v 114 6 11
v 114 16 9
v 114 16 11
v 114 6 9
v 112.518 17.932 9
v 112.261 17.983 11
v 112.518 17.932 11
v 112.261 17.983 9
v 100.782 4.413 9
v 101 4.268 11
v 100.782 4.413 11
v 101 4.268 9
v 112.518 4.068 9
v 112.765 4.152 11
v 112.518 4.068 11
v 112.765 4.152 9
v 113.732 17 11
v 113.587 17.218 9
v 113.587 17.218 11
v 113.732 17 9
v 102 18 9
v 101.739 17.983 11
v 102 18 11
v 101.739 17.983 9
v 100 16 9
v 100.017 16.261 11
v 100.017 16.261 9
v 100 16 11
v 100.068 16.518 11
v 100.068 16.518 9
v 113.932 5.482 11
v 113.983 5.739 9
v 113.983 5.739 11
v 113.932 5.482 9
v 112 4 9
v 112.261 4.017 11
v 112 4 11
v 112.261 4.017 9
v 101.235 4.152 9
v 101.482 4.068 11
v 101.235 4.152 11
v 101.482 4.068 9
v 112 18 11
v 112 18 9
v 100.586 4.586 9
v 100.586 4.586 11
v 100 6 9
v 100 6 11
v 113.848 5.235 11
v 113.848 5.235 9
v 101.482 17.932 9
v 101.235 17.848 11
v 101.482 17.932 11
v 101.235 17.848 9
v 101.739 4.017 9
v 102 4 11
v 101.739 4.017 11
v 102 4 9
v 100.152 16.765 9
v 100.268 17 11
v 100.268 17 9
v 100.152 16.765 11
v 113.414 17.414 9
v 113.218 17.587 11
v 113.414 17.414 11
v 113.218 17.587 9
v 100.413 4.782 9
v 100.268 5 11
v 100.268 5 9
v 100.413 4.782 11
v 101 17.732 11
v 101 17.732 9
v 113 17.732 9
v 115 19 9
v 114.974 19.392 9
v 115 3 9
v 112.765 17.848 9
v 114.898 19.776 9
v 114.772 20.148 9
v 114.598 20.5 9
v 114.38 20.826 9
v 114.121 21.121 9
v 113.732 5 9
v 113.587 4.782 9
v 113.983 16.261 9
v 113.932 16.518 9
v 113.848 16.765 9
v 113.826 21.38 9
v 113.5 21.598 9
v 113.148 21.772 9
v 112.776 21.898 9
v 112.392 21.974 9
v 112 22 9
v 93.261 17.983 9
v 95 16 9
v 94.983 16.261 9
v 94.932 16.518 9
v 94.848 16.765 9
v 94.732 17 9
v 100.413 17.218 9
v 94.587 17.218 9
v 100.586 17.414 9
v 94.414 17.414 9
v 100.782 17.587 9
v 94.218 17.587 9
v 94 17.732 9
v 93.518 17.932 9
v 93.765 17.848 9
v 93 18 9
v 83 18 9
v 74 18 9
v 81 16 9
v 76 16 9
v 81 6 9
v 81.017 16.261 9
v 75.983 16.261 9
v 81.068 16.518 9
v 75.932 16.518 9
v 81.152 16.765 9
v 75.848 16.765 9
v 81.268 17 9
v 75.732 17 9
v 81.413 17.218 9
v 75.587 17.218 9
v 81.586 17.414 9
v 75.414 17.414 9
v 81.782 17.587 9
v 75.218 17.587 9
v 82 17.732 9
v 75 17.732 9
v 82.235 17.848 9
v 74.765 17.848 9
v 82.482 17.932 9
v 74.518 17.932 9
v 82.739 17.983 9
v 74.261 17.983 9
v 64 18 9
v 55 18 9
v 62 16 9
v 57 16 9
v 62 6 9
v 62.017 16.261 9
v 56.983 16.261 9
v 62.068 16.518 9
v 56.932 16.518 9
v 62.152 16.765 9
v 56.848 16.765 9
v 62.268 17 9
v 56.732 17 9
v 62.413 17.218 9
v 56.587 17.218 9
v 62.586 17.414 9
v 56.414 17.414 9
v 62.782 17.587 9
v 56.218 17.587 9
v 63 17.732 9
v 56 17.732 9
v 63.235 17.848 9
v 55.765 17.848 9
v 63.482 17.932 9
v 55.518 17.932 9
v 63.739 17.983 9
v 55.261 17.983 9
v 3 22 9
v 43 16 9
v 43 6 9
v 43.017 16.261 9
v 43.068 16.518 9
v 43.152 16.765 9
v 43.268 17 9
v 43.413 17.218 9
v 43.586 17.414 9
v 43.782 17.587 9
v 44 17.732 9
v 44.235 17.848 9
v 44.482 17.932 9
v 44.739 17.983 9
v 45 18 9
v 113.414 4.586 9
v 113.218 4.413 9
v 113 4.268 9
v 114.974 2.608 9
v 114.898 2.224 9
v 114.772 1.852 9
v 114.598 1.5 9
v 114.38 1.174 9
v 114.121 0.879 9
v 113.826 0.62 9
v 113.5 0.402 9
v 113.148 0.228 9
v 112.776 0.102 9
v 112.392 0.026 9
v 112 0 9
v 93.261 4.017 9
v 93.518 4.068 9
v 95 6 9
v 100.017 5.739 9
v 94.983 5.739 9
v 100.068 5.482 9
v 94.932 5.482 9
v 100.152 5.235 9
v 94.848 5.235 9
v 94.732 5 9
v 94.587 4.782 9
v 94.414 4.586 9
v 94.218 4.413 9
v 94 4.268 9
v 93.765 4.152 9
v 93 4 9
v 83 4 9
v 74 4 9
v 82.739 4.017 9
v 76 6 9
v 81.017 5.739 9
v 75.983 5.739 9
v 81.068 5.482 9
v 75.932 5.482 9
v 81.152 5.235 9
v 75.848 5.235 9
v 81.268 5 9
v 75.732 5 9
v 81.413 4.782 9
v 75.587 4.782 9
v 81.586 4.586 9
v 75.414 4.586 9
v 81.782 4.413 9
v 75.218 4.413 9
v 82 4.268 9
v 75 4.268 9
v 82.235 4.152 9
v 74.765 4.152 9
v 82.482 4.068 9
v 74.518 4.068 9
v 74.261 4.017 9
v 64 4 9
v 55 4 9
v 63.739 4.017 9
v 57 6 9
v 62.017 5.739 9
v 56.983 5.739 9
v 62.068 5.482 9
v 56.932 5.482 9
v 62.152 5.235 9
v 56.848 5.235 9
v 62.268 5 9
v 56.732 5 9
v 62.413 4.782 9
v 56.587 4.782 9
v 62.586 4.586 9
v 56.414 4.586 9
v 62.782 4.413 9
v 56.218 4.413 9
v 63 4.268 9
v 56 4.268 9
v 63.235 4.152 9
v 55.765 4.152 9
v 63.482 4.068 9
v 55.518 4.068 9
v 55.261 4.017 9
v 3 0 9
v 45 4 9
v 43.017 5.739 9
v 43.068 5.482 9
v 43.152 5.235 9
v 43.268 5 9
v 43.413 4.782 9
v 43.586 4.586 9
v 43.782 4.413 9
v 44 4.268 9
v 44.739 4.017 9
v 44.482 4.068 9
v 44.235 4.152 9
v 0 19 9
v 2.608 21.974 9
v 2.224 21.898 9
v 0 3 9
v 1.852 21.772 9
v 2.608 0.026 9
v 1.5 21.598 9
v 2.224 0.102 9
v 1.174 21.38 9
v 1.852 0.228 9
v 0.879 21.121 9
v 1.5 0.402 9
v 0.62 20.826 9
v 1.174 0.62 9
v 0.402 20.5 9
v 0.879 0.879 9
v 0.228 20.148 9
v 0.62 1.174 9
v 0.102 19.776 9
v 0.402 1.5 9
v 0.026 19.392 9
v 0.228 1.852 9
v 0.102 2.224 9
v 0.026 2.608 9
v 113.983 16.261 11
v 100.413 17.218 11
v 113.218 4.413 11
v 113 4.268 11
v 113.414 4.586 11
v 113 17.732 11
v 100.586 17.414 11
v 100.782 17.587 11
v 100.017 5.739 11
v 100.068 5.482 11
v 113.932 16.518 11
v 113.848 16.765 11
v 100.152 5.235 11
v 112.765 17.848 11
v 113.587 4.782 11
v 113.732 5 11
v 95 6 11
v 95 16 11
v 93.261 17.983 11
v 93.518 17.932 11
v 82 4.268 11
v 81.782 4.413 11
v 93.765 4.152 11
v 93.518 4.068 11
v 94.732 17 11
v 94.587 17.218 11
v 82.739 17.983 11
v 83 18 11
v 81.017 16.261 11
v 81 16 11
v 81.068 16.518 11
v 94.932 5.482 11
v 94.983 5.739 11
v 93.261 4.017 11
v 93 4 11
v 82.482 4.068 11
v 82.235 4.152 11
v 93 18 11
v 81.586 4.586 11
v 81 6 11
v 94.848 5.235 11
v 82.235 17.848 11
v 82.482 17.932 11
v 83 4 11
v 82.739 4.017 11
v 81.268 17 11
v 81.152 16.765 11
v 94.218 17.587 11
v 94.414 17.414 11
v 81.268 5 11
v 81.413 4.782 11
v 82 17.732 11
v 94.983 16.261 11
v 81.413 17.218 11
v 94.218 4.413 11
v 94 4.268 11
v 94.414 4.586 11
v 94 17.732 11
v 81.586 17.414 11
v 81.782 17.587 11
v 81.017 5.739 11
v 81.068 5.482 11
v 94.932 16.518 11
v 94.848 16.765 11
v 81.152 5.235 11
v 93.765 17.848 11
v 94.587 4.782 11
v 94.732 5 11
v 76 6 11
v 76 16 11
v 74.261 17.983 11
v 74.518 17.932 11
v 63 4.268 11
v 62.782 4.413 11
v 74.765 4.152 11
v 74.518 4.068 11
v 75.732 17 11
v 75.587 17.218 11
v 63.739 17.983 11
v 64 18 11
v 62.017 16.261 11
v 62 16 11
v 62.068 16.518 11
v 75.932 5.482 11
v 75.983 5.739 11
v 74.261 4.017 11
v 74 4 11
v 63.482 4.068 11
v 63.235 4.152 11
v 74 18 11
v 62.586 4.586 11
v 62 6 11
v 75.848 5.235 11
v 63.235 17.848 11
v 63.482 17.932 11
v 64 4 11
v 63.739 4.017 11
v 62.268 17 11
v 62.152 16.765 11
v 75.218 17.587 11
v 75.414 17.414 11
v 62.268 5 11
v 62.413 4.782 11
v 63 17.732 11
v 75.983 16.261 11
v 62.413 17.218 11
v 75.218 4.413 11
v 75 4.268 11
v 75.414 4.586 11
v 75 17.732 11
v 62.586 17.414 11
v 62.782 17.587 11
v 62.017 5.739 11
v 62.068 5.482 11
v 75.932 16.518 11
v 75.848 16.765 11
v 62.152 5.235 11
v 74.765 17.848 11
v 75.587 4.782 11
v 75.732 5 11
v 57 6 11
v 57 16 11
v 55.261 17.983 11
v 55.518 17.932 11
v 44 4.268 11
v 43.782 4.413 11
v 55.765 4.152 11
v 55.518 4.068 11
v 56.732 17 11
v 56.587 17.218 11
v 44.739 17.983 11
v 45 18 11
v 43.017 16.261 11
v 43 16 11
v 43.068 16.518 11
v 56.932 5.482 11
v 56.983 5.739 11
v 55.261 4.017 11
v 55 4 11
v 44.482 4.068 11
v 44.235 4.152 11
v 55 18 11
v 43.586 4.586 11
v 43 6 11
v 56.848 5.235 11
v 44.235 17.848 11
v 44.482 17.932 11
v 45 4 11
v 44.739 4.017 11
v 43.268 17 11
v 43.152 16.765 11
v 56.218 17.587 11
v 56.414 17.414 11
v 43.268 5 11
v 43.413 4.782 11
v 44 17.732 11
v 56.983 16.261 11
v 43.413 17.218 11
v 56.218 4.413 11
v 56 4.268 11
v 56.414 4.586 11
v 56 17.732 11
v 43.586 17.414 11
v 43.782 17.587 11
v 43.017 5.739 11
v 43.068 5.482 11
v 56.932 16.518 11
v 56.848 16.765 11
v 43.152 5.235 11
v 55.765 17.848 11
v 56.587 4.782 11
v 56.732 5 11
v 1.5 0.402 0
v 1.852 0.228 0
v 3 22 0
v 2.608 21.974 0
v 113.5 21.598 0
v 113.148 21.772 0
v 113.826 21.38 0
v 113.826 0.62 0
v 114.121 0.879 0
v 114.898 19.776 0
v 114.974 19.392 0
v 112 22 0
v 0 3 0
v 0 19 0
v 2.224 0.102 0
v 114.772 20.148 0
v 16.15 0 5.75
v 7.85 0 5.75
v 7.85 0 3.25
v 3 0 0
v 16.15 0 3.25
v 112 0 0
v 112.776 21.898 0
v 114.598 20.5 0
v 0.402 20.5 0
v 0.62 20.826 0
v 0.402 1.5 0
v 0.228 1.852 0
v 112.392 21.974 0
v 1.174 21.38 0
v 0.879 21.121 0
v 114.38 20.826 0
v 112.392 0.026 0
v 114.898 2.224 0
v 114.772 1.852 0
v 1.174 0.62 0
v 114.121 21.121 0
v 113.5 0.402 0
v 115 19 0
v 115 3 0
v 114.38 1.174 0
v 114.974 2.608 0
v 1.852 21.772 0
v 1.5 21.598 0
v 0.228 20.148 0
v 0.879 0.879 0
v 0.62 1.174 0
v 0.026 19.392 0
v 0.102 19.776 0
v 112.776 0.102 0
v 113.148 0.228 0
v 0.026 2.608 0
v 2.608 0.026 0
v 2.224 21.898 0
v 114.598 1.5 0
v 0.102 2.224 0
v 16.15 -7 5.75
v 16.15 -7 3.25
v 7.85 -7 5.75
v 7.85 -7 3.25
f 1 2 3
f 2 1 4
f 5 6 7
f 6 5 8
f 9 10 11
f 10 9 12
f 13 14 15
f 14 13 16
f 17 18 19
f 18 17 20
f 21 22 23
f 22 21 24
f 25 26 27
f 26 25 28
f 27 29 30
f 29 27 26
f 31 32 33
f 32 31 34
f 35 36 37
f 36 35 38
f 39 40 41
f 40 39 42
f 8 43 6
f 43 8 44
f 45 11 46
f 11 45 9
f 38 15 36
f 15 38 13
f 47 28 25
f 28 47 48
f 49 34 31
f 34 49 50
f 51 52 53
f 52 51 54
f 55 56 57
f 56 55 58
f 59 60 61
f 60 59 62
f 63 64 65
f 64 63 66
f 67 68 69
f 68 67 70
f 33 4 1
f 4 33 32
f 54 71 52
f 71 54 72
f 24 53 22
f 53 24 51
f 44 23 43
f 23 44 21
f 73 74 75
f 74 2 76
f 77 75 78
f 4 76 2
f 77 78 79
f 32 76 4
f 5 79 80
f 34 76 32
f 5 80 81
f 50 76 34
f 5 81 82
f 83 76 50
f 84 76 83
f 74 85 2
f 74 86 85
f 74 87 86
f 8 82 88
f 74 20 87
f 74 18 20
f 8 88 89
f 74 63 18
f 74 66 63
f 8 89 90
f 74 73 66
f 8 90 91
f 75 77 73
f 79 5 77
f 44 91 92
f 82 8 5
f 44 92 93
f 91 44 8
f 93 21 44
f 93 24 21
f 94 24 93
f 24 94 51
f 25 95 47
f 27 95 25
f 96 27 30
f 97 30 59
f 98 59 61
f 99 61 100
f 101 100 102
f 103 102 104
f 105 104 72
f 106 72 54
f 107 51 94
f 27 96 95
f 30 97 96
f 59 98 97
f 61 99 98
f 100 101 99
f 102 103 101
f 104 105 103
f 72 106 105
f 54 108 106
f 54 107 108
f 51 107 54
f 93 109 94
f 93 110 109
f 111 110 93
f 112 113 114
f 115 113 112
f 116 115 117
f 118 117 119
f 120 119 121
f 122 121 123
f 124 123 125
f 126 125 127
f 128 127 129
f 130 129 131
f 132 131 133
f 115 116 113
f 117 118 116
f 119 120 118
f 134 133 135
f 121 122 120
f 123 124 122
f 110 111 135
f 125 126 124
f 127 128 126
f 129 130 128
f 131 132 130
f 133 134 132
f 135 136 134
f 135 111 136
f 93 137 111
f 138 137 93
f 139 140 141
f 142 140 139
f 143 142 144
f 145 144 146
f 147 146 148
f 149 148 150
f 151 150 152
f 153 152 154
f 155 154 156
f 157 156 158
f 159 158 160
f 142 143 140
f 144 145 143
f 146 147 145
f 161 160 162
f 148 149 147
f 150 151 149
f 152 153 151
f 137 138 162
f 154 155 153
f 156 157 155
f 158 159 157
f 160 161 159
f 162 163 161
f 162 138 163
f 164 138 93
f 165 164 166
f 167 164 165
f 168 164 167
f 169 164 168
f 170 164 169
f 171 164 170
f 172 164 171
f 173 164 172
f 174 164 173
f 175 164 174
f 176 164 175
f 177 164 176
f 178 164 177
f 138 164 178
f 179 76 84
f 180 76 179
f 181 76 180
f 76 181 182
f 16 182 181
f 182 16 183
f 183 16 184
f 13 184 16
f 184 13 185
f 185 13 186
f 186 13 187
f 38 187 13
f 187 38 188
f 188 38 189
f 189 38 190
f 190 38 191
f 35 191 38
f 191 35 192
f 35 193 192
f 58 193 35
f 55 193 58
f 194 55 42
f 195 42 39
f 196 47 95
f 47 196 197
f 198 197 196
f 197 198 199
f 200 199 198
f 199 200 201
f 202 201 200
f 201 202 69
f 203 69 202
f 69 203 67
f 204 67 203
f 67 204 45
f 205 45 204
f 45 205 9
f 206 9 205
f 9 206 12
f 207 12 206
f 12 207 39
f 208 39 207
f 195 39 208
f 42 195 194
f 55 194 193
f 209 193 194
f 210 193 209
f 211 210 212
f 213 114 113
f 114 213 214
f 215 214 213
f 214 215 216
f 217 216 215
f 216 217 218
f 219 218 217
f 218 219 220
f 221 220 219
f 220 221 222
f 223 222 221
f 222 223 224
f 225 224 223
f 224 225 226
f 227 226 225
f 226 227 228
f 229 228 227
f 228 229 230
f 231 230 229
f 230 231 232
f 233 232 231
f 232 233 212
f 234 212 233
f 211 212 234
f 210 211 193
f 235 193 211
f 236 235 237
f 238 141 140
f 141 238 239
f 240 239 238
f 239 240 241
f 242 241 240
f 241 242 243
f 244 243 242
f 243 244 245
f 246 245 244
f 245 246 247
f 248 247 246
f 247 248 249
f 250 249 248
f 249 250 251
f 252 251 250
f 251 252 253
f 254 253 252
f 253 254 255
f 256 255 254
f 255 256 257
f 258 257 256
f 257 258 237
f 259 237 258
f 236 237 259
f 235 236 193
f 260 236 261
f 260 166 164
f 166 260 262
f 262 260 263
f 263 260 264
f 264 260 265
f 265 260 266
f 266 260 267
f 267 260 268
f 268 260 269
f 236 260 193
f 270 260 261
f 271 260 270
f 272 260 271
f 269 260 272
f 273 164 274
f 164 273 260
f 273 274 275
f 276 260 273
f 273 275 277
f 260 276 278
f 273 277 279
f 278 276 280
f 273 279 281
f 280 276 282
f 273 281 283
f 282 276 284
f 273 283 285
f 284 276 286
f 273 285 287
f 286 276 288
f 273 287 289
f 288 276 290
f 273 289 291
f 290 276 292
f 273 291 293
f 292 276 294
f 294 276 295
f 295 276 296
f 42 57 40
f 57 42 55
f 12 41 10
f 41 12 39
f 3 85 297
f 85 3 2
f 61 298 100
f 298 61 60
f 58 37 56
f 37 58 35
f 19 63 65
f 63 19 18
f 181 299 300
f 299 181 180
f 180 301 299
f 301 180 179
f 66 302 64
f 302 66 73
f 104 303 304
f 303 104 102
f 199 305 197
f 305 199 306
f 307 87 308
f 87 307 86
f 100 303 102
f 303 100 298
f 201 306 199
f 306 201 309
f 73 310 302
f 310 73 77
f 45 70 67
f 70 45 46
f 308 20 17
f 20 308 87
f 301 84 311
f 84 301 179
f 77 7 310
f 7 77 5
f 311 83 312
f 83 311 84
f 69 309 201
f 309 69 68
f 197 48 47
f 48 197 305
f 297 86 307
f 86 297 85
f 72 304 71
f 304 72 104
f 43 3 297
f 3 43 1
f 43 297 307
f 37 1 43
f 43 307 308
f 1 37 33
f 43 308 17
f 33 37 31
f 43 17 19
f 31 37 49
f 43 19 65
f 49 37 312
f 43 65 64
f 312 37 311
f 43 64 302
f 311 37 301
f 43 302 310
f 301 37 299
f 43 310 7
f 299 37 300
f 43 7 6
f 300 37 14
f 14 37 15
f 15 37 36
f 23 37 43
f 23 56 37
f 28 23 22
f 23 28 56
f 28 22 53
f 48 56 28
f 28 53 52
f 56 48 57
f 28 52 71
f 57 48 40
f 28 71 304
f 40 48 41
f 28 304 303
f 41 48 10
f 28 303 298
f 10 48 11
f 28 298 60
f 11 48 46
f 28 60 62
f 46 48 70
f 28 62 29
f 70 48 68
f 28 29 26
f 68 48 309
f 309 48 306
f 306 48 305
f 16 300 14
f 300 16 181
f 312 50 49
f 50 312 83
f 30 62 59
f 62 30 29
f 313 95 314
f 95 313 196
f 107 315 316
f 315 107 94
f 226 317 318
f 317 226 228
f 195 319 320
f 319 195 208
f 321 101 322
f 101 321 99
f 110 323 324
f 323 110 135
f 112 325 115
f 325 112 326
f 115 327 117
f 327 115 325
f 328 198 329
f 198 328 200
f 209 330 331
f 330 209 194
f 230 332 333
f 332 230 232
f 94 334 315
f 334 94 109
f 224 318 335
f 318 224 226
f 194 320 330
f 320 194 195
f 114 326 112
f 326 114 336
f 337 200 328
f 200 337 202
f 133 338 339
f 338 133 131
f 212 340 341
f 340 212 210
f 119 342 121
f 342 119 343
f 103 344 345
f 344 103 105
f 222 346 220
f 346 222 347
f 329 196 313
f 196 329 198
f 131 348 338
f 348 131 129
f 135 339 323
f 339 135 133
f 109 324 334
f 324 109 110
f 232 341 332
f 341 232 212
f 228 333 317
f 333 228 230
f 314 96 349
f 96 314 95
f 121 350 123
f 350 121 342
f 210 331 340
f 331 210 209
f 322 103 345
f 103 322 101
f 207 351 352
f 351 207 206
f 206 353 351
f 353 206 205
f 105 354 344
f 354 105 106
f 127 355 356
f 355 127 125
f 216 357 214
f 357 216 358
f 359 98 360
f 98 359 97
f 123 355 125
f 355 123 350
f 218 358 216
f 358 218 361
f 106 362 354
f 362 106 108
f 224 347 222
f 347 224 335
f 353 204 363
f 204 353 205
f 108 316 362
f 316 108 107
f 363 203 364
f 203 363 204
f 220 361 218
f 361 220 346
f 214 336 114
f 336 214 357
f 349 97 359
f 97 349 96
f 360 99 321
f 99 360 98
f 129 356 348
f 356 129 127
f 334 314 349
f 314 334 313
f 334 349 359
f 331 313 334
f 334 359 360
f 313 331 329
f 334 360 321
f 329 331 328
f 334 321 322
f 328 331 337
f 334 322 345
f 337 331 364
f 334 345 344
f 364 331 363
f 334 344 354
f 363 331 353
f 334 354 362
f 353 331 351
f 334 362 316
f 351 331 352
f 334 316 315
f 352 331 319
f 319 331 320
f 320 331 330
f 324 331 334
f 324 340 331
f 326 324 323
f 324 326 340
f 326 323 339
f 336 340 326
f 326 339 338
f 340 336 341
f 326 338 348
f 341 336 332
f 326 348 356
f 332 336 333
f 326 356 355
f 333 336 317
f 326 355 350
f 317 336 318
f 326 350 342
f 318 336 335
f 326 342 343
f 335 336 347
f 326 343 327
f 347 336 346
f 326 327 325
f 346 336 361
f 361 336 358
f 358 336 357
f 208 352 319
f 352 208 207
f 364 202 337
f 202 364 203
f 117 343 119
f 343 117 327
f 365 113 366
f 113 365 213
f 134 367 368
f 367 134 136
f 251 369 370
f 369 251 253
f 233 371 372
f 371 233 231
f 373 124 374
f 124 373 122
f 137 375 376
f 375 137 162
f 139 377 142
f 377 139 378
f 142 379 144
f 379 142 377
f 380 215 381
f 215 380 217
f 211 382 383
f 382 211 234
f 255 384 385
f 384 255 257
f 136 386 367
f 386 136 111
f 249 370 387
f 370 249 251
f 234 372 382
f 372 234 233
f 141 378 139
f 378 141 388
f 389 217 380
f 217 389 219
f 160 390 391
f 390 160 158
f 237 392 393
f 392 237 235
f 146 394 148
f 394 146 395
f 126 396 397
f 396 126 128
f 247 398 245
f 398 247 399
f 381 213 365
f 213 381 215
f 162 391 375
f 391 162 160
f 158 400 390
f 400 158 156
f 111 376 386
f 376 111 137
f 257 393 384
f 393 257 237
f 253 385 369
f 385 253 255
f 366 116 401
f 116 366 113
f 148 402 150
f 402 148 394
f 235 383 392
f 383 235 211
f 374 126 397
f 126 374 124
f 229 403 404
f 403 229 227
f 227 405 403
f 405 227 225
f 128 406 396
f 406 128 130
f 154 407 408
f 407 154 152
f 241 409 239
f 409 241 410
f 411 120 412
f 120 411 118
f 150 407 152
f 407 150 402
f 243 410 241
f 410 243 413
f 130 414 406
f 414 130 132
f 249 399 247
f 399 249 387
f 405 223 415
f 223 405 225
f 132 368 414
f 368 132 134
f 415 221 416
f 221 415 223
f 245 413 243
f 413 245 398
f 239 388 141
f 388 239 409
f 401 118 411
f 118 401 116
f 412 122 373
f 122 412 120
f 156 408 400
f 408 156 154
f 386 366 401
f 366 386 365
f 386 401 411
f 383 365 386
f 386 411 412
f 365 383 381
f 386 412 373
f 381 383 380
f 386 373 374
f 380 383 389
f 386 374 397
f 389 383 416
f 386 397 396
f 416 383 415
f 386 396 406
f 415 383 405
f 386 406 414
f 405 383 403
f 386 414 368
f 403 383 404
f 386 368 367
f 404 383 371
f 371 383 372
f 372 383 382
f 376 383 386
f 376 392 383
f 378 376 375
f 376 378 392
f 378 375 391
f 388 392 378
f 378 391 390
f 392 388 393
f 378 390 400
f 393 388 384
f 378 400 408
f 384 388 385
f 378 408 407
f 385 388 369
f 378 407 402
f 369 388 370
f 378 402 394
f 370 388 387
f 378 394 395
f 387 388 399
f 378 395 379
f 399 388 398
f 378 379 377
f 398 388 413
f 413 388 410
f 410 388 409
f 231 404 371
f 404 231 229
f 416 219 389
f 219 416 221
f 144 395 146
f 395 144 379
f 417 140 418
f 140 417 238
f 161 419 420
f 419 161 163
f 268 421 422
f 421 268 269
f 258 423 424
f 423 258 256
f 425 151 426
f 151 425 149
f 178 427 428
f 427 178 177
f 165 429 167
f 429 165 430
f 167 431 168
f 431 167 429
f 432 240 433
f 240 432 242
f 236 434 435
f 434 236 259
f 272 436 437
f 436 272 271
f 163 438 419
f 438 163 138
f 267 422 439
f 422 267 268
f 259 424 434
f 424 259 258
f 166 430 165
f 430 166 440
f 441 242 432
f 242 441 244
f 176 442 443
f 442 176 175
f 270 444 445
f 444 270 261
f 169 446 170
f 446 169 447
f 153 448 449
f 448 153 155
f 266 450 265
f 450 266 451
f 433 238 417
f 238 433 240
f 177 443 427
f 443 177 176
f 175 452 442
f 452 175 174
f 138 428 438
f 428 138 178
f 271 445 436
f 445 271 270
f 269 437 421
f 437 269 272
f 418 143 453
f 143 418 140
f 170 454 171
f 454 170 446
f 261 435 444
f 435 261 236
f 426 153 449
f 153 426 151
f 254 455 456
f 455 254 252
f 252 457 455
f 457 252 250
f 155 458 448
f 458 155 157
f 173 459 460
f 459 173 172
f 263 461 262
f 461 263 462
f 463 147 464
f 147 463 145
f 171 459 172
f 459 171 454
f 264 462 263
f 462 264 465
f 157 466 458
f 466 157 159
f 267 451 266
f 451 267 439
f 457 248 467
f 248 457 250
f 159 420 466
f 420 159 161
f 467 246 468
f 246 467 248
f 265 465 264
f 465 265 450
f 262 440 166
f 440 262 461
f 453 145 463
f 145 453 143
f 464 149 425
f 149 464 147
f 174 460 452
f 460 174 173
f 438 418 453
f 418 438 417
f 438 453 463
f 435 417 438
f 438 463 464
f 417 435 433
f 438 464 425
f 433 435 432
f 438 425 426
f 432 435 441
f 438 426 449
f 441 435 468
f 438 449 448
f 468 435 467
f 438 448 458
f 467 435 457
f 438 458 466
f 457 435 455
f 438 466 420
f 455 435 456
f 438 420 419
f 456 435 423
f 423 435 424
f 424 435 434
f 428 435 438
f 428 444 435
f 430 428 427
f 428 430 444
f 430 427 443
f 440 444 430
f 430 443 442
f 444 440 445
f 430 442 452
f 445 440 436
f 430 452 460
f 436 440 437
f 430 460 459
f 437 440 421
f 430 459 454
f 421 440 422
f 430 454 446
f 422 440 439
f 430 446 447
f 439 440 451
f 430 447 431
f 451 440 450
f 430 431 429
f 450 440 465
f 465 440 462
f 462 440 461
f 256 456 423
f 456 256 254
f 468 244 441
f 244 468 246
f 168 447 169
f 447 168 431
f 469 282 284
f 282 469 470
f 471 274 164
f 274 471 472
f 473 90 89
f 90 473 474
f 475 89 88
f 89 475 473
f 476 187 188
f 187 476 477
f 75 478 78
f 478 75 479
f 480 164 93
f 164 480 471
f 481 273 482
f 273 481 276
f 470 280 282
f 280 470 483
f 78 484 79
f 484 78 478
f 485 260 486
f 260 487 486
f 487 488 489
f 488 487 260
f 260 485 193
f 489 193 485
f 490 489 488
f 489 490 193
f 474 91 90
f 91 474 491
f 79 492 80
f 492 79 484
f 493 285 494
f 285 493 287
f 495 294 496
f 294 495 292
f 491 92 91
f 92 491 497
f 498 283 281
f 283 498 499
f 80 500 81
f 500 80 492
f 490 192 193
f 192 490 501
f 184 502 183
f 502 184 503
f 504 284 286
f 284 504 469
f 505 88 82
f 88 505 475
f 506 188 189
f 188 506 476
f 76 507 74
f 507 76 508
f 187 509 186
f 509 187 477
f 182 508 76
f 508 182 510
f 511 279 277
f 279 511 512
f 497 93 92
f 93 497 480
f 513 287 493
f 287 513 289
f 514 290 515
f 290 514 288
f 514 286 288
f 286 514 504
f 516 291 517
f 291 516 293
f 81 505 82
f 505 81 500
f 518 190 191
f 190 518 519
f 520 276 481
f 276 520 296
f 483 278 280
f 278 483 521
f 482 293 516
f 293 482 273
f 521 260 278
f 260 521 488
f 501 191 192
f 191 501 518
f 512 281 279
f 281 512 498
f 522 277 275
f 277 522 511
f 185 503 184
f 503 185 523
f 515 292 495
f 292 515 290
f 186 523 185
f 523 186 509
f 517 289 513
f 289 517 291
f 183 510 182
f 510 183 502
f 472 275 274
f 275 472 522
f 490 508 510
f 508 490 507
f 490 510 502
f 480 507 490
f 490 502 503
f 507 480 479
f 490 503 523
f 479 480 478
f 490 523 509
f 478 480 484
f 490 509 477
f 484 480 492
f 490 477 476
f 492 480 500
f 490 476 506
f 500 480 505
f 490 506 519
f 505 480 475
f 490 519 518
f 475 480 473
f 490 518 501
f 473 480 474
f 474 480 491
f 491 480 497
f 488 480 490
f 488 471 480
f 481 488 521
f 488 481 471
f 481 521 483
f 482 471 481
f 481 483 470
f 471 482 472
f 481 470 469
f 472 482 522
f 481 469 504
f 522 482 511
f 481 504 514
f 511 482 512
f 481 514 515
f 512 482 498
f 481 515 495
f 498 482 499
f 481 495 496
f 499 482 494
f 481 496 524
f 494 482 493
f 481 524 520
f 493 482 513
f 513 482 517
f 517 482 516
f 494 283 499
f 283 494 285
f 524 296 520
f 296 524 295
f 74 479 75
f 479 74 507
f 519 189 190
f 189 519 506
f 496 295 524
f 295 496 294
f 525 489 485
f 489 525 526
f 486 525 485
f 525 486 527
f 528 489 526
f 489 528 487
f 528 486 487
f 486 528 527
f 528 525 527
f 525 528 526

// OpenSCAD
// K1 enclosure v0 — rough one-piece concept sketch (superseded by v1/v2)
// Not for printing/fit — a first-pass 3D sketch of the flush keypad form.
// All dimensions are placeholders until the MacBook port position and
// side taper are measured (see project summary).

$fn = 48;

/* ---------- Parameters ---------- */

// Body (sits along the MacBook's side, running to the front edge)
body_len    = 115;   // along the laptop side, rear (port) to front edge
body_wid    = 22;    // sticks out sideways from the laptop
body_ht     = 9;     // thin — roughly deck height
body_rad    = 3;     // corner rounding

// USB-C plug stub (perpendicular, out of the inner long face, near the rear)
plug_wid    = 8.3;   // USB-C plug width
plug_thk    = 2.5;   // USB-C plug thickness
plug_len    = 7;     // how far it protrudes into the port
plug_from_rear = 12; // plug center distance from the rear end of the body

// Keys
key_count   = 4;
key_size    = 14;    // square keycap side (MX-ish footprint)
key_pitch   = 19;    // MX spacing
key_ht      = 2;     // how proud the caps sit above the deck
key_rad     = 2;
keys_from_front = 8; // first key center from the front end

/* ---------- Helpers ---------- */

module rounded_box(l, w, h, r) {
    // rounded in plan view, flat top/bottom
    hull()
        for (x = [r, l - r], y = [r, w - r])
            translate([x, y, 0]) cylinder(h = h, r = r);
}

/* ---------- Parts ---------- */

// Coordinate frame: X = rear→front along the laptop side,
// Y = away from the laptop (Y=0 face touches the chassis), Z = up.

module body() {
    rounded_box(body_len, body_wid, body_ht, body_rad);
}

module plug() {
    // protrudes in -Y (into the laptop), vertically centered on the port height
    translate([plug_from_rear - plug_wid / 2,
               -plug_len,
               body_ht / 2 - plug_thk / 2])
        cube([plug_wid, plug_len + 1, plug_thk]);
}

module keys() {
    for (i = [0 : key_count - 1])
        translate([body_len - keys_from_front - i * key_pitch - key_size / 2,
                   (body_wid - key_size) / 2,
                   body_ht])
            rounded_box(key_size, key_size, key_ht, key_rad);
}

/* ---------- Assembly ---------- */

union() {
    body();
    plug();
    keys();
}
